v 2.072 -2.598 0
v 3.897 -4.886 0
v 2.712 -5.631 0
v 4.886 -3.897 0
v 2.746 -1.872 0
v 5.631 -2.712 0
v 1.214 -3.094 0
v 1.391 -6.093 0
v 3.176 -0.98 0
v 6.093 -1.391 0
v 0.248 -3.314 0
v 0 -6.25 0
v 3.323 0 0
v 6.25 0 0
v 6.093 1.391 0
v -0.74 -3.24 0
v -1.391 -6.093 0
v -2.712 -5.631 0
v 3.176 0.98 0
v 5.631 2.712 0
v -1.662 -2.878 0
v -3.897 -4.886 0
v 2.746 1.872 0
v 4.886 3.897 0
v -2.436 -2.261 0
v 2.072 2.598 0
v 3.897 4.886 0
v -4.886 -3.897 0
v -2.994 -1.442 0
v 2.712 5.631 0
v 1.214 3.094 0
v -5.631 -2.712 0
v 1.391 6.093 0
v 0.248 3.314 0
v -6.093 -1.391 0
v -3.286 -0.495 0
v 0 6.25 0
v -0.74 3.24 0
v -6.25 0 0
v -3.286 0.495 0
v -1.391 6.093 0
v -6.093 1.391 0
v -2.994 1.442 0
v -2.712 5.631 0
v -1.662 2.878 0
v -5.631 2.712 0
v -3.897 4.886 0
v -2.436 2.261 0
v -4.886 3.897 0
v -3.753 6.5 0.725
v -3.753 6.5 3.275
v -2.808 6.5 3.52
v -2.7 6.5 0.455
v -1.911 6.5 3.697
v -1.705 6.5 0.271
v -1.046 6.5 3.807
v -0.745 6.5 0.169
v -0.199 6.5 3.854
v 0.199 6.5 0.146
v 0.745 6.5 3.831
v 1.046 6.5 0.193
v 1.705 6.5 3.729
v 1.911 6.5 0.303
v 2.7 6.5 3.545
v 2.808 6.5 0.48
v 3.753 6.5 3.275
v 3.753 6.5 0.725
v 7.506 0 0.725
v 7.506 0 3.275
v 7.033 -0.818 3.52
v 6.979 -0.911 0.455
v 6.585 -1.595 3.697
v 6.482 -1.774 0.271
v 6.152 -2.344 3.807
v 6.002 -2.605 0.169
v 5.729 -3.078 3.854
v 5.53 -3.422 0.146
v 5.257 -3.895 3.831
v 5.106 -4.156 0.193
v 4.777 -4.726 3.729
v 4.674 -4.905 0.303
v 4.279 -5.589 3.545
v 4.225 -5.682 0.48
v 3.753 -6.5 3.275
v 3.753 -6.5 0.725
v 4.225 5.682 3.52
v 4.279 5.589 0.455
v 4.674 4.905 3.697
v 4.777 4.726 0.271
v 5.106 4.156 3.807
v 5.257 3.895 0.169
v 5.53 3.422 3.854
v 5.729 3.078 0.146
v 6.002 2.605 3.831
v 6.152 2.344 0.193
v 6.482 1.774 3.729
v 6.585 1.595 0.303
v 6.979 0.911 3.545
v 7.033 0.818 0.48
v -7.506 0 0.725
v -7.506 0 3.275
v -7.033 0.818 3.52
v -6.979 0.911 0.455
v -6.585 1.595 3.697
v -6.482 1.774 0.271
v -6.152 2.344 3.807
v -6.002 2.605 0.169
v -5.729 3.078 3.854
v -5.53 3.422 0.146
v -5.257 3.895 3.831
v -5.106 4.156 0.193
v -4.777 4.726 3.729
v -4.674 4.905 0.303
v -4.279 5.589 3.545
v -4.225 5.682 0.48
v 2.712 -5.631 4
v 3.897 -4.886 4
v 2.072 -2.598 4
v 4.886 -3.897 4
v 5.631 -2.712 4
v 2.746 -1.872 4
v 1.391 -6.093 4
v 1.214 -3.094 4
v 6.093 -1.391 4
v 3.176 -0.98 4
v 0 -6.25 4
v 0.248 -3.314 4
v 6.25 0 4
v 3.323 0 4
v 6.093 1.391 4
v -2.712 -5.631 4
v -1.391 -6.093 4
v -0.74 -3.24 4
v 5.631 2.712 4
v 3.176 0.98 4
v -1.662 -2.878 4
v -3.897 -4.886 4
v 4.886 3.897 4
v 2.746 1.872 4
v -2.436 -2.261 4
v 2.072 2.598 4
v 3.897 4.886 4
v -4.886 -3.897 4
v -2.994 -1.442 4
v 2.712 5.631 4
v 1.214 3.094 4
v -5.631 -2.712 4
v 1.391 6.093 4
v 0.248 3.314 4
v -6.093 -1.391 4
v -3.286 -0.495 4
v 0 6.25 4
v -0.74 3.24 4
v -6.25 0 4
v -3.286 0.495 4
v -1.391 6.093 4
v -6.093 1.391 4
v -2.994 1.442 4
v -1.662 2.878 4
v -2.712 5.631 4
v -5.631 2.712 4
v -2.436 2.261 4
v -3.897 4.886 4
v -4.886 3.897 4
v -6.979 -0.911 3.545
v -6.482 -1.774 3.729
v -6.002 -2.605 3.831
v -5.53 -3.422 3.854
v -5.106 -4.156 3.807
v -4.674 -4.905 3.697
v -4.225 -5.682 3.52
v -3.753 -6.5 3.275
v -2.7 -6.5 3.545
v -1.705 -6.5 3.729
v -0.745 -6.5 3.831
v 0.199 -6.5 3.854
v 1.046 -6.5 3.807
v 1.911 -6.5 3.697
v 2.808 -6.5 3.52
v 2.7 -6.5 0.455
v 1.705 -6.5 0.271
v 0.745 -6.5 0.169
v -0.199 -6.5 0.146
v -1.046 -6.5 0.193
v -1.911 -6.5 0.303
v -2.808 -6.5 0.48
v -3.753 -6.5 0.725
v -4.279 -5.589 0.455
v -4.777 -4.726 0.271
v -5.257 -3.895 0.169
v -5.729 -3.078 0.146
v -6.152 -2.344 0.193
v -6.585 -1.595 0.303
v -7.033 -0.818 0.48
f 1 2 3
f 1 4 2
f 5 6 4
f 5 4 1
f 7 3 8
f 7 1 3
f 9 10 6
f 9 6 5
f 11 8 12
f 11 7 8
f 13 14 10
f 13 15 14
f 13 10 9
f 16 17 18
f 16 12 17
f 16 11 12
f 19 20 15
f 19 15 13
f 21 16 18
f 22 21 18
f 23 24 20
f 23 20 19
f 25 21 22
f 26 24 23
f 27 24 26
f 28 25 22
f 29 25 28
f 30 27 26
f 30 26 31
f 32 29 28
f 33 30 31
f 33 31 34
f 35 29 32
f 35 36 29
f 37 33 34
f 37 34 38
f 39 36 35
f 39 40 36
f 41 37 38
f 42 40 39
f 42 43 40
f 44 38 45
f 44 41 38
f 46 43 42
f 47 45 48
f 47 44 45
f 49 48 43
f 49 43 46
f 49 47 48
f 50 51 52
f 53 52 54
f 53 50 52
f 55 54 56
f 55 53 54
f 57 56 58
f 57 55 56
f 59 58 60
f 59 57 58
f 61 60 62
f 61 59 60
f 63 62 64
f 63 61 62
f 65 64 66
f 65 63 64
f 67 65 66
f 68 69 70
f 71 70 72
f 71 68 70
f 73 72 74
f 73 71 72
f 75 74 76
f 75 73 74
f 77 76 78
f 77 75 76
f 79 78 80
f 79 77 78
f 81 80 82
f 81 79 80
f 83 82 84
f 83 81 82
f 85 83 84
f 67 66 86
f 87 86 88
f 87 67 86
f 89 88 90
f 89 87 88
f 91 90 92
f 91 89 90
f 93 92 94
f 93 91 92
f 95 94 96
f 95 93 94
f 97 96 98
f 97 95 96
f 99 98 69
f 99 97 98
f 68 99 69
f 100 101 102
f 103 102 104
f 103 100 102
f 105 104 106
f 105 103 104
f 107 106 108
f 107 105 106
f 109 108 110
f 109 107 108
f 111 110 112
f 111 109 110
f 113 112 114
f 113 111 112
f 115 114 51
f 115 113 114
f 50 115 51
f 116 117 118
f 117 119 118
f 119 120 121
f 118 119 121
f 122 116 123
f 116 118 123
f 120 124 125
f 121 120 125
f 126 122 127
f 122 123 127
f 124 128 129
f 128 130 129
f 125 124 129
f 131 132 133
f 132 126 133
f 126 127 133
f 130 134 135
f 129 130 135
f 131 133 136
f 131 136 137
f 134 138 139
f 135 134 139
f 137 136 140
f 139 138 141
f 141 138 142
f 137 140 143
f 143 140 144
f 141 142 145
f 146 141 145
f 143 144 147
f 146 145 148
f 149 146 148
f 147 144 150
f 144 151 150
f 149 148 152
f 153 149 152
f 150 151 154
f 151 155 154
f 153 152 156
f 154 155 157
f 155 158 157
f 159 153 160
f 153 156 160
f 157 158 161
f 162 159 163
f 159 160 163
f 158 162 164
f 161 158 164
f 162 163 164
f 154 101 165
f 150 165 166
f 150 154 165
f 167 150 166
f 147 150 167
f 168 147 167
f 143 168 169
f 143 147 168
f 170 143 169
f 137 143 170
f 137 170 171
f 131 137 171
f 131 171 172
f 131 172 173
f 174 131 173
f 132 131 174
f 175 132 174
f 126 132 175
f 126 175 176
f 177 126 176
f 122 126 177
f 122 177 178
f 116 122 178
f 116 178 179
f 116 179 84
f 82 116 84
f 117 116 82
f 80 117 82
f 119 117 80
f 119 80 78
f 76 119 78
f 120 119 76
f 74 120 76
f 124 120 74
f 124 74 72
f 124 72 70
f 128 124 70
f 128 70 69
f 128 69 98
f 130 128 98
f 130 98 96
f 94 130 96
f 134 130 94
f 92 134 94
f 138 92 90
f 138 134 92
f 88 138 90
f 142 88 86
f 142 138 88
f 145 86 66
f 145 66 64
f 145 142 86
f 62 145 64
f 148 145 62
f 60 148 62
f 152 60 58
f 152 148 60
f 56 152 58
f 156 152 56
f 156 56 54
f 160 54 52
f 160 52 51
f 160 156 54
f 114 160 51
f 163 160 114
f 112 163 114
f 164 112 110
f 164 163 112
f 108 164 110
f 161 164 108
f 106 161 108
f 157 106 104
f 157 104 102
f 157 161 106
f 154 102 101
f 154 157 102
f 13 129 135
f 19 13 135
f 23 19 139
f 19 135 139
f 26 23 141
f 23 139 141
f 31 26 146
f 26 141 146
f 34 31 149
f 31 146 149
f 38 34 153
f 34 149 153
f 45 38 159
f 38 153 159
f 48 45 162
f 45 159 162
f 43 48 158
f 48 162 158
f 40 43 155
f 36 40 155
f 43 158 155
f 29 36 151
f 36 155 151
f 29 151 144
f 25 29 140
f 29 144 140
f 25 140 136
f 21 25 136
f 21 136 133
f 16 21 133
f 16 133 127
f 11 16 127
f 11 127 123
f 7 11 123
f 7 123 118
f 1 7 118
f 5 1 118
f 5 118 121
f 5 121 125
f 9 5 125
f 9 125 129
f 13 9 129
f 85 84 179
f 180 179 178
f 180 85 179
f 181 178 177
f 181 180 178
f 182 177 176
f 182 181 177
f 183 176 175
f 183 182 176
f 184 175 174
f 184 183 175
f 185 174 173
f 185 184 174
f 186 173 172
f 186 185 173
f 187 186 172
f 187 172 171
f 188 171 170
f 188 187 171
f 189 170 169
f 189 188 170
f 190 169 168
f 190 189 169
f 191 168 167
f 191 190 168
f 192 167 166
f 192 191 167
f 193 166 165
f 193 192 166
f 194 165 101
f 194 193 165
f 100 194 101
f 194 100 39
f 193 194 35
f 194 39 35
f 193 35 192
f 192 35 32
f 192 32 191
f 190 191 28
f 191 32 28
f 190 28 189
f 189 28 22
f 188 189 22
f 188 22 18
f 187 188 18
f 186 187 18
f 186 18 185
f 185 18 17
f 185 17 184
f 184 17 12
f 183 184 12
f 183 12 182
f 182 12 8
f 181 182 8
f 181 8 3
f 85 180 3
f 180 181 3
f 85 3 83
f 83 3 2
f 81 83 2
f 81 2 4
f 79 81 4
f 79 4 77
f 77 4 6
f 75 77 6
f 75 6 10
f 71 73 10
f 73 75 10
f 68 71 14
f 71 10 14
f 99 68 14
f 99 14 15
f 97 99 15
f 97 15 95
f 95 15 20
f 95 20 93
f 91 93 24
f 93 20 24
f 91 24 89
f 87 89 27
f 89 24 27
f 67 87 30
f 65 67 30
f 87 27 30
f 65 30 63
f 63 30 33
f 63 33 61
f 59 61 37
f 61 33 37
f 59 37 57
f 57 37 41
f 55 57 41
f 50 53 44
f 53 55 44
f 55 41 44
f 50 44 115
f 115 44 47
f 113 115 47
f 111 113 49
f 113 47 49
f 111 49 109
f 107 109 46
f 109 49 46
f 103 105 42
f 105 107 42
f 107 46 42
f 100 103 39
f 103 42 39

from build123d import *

# Parameters (mm, degrees)
BASE_EXTRUSION_DEPTH    = 4
ESQUISSE2_R             = 3.3234375
ENL_V_MAT_EXTRU_1_DEPTH = 5


with BuildPart() as part:
    # Esquisse1 → Base-Extrusion (new body)
    with BuildSketch(Plane.XY):
        Polygon((-7.505553499, 0), (-3.75277675, 6.5), (3.75277675, 6.5), (7.505553499, 0), (3.75277675, -6.5), (-3.75277675, -6.5), align=None)
    extrude(amount=BASE_EXTRUSION_DEPTH)

    # Esquisse2 → Enlèv. mat.-Extru.1 (cut, through all)
    with BuildSketch(Plane.XY.offset(4)):
        Circle(ESQUISSE2_R)
    extrude(amount=-ENL_V_MAT_EXTRU_1_DEPTH, mode=Mode.SUBTRACT)

    # Esquisse3 → Enlever de la matière-Révolution1 (revolve, cut)
    with BuildSketch(Plane(origin=(0, 0, 0), x_dir=(1, 0, 0), z_dir=(0, 1, 0))):
        Polygon((-6.25, 0), (-7.505553499, 0), (-7.505553499, -0.724894151), align=None)
    enlever_de_la_mati_re_r_volution1 = revolve(axis=Axis((0, 0, 0), (0, 0, 1)), mode=Mode.SUBTRACT)

    # Symétrie1: Enlever de la matière-Révolution1 across Plan4
    add(enlever_de_la_mati_re_r_volution1.mirror(Plane(origin=(0, 0, 2), x_dir=(-1, 0, 0), z_dir=(0, 0, -1))), mode=Mode.SUBTRACT)


solid = part.part
